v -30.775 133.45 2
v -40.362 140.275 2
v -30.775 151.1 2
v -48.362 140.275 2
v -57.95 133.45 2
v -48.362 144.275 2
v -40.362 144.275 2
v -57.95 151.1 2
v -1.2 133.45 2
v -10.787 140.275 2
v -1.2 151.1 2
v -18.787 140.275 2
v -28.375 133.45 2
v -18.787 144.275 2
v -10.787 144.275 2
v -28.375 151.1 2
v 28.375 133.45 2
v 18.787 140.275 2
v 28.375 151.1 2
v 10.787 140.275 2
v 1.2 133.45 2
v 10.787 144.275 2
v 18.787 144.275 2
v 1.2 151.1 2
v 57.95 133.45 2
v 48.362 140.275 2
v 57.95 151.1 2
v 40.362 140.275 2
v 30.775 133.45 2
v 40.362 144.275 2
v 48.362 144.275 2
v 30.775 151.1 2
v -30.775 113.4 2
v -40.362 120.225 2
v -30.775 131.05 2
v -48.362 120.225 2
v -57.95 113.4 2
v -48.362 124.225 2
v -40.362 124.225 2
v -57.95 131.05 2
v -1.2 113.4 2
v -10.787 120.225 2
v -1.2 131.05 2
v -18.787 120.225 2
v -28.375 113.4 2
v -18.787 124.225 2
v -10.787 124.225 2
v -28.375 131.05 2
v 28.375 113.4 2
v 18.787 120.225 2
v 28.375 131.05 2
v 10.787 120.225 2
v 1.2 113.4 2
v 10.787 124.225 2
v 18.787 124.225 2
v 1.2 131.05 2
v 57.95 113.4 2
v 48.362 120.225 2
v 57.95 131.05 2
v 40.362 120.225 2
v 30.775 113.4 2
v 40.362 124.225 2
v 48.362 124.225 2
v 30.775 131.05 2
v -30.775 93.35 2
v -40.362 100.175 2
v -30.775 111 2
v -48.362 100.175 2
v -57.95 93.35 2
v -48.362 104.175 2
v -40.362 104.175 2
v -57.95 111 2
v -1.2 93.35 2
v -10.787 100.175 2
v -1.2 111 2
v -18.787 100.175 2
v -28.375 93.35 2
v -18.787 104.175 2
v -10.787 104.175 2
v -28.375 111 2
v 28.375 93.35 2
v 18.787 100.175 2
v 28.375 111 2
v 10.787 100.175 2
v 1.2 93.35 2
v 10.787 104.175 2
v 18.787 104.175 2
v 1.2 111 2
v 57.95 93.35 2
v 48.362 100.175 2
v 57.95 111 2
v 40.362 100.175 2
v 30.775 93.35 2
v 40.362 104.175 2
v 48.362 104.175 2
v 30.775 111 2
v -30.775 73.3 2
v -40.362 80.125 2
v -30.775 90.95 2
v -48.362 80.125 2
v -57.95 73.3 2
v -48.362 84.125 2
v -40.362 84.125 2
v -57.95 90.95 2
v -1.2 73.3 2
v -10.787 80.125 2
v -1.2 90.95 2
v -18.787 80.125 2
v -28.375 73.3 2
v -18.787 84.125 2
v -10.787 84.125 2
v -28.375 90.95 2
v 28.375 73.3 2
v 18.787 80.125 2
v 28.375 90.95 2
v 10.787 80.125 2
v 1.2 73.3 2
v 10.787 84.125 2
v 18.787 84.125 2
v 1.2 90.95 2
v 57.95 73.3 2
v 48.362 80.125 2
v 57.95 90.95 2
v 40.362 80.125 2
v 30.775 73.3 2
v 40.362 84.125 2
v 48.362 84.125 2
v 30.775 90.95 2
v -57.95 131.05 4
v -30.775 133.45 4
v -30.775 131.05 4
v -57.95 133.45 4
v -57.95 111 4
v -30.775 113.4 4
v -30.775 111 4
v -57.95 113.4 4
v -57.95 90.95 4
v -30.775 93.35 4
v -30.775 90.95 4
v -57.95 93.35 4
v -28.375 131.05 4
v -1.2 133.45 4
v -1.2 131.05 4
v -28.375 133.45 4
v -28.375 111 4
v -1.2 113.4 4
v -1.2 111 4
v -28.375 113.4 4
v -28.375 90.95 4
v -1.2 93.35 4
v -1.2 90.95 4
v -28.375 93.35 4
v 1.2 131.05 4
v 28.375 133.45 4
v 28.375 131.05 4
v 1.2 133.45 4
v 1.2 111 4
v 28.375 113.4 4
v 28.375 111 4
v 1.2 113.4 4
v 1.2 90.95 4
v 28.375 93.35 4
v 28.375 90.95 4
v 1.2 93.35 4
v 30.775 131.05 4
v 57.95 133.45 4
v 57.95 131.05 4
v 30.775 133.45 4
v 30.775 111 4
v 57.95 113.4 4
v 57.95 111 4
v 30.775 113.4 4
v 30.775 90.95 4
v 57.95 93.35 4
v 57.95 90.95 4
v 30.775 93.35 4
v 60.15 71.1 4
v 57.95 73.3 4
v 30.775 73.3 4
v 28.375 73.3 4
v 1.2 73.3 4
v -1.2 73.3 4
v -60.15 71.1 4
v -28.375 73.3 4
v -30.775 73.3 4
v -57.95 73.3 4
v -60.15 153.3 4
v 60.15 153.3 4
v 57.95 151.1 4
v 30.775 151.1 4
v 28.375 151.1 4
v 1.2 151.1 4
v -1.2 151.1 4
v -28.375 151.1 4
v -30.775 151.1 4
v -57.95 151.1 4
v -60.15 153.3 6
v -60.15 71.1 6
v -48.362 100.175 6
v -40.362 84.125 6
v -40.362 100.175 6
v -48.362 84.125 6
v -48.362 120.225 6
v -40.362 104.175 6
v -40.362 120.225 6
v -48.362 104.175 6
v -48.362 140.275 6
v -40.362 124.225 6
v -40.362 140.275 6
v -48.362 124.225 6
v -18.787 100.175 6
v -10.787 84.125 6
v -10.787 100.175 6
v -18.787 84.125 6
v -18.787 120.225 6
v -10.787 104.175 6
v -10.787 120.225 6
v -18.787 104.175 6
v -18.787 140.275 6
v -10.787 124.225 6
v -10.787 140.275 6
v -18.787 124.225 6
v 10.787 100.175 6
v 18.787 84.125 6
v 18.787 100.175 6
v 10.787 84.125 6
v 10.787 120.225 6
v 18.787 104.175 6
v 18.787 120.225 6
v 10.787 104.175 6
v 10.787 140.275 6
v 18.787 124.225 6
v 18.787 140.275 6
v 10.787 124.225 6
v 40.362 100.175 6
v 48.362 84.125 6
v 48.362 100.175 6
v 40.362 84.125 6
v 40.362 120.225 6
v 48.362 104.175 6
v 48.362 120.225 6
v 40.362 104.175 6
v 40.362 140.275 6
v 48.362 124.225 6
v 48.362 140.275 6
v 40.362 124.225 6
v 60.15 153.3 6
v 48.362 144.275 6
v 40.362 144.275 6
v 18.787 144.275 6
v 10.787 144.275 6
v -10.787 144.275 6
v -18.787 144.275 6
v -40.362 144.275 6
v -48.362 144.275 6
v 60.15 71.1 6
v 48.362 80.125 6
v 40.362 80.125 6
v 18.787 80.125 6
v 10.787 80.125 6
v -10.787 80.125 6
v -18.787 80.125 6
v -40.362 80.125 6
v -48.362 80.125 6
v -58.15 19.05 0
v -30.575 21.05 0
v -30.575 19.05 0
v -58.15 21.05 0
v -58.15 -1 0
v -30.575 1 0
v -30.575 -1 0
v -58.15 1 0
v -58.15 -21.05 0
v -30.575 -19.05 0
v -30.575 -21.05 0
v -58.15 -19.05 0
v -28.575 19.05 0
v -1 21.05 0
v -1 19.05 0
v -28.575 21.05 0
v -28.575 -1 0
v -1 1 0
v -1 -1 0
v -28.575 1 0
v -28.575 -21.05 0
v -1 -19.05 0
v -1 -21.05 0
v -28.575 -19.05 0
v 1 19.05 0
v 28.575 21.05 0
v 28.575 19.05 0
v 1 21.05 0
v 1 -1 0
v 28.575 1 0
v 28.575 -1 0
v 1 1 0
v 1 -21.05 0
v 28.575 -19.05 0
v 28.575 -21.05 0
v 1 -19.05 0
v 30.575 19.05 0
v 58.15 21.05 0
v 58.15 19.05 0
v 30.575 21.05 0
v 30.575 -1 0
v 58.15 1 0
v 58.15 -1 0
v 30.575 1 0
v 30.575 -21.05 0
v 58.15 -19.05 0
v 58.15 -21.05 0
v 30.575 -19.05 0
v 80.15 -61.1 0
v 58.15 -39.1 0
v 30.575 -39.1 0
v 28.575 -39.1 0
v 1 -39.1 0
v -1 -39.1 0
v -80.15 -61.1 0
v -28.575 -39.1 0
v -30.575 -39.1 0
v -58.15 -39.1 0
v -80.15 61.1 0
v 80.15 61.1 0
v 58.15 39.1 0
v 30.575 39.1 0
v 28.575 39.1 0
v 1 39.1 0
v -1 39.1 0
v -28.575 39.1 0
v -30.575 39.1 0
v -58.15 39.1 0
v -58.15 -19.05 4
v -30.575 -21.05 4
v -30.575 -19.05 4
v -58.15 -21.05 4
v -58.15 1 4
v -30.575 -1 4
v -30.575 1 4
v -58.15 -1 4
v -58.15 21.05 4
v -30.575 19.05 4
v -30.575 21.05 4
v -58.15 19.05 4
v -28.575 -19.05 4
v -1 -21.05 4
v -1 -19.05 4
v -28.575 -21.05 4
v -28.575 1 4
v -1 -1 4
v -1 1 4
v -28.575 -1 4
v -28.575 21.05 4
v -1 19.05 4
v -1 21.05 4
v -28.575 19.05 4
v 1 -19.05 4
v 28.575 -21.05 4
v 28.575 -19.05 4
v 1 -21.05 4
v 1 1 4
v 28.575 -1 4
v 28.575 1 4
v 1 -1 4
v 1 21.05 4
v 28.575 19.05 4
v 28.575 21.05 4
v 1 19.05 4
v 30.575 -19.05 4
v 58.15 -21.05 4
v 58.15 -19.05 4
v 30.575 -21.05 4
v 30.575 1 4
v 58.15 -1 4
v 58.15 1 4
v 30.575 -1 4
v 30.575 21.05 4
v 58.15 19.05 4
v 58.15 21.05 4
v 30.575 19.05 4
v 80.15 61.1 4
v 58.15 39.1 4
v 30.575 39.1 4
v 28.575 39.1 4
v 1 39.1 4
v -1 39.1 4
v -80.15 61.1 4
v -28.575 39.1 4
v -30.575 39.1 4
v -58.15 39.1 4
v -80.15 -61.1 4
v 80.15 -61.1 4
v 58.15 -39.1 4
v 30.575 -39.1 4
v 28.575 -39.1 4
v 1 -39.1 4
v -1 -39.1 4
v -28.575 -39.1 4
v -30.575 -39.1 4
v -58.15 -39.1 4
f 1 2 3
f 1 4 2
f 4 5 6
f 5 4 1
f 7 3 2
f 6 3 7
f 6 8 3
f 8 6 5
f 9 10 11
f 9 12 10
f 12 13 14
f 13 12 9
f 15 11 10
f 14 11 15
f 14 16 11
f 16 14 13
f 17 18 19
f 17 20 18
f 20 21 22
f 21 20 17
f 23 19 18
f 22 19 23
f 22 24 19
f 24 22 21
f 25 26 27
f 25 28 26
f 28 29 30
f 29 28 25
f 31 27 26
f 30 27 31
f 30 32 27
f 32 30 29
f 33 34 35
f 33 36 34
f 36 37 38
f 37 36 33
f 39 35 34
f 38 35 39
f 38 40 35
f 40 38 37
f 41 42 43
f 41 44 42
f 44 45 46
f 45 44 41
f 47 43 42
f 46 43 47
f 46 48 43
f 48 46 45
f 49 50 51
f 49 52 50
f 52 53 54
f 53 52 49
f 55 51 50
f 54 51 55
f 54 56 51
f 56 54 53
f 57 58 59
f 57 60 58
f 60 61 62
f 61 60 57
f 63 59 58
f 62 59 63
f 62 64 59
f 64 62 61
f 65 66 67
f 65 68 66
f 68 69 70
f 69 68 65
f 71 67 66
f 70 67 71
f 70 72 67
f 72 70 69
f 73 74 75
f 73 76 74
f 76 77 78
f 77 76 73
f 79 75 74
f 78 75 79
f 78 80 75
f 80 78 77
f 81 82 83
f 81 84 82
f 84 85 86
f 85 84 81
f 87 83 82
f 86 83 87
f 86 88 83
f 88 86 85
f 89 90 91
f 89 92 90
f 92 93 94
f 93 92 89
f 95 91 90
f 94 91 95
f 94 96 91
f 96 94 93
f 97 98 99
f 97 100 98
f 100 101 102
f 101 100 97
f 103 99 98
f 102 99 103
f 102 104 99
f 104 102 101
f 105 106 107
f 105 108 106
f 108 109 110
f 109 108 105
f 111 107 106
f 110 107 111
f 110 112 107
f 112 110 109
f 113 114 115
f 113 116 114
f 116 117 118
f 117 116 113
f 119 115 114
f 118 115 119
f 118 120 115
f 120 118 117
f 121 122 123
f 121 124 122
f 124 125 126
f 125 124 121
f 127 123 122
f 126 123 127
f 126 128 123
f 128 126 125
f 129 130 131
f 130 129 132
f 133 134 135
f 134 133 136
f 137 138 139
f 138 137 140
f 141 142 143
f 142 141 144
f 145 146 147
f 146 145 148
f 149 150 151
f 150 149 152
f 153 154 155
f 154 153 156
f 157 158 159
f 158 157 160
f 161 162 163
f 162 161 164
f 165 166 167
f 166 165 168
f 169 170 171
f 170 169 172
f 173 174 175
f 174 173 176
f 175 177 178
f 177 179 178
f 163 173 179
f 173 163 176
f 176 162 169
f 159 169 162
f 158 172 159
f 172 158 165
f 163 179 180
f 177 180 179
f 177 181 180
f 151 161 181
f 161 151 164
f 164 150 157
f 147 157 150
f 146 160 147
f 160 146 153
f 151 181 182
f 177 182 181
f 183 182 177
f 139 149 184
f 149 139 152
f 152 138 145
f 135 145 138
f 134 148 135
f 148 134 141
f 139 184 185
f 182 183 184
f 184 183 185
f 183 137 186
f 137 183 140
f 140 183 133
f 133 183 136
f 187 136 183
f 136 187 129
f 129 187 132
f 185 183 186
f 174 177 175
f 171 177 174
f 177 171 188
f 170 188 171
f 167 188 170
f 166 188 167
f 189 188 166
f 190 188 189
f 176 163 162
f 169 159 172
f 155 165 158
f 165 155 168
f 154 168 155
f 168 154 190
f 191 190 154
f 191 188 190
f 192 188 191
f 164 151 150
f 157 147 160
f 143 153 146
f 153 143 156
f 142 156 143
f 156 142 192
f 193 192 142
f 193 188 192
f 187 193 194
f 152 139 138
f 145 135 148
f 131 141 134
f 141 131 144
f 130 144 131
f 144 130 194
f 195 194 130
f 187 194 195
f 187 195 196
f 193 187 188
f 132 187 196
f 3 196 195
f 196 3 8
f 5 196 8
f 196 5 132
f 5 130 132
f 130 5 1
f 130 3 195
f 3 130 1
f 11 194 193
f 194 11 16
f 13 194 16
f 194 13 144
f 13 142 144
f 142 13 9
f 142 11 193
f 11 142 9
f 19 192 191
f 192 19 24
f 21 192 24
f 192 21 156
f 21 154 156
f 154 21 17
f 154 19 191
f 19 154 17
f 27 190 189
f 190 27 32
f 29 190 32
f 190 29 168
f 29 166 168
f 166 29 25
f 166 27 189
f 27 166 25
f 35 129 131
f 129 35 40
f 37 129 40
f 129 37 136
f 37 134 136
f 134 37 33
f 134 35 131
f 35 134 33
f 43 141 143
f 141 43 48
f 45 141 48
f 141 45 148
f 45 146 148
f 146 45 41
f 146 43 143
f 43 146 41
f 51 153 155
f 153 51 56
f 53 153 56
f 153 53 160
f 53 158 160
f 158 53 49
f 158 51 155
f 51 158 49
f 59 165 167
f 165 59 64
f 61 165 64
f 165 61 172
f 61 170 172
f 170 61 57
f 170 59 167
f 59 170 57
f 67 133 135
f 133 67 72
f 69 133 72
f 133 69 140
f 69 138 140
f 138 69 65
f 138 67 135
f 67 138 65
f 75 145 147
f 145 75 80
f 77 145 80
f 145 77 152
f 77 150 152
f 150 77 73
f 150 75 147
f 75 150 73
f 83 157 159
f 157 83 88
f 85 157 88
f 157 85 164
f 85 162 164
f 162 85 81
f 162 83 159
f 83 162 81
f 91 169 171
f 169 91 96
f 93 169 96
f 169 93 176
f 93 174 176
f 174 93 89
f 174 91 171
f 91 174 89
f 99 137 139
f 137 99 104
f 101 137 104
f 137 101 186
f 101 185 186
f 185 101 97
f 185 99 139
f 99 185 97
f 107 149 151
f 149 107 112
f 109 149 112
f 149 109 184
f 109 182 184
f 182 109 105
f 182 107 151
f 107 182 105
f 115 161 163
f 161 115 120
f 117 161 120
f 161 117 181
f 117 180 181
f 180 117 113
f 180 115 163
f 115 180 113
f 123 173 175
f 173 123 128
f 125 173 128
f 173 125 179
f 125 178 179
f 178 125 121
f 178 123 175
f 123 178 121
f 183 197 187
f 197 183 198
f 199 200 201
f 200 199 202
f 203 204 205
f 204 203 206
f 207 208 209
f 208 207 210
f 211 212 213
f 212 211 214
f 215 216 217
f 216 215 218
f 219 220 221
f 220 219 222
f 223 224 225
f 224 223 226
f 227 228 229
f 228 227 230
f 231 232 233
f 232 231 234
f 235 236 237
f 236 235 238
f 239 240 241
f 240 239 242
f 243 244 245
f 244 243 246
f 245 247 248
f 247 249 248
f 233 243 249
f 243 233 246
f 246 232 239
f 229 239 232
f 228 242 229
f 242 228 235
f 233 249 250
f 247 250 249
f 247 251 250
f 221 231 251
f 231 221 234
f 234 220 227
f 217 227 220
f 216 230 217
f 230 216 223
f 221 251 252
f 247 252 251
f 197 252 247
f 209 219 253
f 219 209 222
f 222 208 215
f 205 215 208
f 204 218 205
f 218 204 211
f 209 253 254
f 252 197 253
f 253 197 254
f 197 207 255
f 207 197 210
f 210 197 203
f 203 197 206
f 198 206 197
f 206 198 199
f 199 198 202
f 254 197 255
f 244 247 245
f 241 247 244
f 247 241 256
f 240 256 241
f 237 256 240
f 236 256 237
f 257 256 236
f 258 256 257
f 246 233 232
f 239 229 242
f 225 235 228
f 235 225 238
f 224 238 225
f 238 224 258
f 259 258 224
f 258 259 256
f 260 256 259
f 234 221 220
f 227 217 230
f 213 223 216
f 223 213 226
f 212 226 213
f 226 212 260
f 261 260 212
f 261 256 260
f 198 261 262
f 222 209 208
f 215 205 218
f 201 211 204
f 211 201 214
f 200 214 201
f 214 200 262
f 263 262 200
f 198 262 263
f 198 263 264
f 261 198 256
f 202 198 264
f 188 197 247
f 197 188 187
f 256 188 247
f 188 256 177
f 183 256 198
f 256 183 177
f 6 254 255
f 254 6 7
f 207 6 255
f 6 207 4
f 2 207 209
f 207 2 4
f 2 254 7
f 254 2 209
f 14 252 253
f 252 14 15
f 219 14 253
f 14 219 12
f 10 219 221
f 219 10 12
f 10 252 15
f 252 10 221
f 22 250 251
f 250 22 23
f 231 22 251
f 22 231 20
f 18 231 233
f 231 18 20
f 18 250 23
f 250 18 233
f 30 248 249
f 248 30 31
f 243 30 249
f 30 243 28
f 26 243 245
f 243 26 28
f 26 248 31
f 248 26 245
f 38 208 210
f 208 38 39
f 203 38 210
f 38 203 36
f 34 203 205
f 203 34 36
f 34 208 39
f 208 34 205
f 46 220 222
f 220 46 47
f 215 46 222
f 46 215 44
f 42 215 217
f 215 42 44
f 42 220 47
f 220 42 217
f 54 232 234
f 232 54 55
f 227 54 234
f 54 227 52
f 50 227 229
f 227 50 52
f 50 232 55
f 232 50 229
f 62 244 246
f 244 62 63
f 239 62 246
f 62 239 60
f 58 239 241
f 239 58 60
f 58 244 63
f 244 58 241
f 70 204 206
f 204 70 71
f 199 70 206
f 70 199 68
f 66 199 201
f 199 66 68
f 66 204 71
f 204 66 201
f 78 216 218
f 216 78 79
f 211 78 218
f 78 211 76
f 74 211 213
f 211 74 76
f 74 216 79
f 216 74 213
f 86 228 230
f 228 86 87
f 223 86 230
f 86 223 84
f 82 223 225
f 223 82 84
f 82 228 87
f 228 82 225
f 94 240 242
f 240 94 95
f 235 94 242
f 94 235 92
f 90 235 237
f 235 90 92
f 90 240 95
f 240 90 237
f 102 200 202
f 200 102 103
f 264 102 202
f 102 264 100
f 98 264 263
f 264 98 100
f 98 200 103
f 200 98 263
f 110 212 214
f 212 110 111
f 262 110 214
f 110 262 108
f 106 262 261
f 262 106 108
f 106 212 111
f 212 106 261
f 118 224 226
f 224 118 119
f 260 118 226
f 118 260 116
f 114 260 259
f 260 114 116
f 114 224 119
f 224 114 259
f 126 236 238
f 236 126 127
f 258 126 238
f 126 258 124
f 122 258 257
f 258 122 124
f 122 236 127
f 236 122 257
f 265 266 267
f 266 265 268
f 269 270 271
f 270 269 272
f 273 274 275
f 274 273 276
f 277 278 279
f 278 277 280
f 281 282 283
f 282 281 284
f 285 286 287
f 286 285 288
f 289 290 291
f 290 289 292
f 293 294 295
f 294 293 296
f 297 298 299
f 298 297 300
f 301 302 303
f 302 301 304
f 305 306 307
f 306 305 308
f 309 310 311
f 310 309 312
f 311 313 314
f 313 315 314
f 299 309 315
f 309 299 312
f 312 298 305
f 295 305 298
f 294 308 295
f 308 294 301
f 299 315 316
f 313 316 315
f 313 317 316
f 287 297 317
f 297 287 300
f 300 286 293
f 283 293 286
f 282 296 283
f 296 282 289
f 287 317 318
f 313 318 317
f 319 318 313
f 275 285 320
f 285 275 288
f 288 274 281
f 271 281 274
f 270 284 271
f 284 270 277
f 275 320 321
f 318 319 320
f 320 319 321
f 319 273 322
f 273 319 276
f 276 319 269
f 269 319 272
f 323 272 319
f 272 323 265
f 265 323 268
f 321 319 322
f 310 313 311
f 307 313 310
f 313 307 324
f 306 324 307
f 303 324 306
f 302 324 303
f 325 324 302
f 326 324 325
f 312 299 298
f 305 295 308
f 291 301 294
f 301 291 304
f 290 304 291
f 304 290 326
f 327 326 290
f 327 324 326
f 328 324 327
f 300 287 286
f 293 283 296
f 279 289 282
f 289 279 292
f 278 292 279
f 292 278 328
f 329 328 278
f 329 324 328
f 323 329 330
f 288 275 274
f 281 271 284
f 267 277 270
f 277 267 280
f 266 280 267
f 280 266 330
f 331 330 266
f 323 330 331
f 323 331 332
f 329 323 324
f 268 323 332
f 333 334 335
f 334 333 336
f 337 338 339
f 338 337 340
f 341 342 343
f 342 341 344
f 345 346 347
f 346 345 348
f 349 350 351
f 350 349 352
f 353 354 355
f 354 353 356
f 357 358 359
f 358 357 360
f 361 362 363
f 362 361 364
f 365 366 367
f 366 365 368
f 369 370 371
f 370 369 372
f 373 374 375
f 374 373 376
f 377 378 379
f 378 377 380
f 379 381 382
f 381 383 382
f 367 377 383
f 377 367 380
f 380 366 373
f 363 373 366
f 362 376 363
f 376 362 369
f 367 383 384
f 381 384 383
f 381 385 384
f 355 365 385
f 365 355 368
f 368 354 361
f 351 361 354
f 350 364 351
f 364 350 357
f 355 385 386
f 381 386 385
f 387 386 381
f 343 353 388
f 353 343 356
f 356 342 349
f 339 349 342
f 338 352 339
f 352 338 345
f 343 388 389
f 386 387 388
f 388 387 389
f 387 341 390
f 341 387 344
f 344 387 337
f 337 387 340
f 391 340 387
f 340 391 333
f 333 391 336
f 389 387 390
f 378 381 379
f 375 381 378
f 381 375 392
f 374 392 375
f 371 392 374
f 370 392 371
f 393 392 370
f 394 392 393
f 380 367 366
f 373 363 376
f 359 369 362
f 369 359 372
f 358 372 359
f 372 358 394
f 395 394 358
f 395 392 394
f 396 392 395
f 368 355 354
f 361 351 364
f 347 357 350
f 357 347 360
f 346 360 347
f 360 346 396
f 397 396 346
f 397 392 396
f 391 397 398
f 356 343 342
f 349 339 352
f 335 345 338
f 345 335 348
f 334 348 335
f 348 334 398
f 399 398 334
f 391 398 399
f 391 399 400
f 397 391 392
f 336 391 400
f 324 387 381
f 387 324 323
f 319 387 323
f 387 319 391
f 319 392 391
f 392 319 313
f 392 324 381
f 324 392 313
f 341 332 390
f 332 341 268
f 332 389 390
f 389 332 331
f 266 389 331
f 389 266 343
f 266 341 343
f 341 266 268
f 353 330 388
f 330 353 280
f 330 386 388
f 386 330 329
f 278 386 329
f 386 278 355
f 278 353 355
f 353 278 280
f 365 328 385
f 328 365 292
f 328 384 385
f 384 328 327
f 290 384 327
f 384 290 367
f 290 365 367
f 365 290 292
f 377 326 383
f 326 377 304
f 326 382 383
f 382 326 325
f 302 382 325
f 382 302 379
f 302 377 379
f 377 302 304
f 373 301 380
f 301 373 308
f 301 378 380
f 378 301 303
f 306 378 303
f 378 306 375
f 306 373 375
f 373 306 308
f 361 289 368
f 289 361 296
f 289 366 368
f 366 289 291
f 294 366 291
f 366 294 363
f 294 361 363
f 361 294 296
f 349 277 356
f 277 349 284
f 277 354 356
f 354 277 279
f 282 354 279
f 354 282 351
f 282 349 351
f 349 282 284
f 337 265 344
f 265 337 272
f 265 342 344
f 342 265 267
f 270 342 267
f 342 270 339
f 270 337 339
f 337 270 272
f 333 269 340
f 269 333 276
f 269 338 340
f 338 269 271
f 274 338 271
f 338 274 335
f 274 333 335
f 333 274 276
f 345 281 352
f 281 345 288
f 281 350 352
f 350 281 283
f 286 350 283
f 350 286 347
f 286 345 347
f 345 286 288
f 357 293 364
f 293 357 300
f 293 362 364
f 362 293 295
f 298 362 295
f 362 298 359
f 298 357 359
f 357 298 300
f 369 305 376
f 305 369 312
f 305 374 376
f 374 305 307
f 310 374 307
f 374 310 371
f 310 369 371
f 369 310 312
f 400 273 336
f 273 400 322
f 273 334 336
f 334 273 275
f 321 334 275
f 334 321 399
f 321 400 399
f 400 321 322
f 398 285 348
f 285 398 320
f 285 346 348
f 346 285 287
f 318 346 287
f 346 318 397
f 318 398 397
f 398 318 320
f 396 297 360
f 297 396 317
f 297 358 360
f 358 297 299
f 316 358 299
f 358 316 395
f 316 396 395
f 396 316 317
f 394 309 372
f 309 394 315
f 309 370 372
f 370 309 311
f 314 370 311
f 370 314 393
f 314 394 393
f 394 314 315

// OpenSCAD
// file: ../common/shared-variables.scad
$fn = 150;

u_1 = 19.05;

plate_corner_radius = 2;

screw_hole_diameter = 2.7;

switch_neck_thickness = 1.2;
switch_neck_width = 13.9;
switch_hole_width = switch_neck_width + 2;

rotary_encoder_width = 17;
rotary_encoder_height = 17;

magnet_diameter = 5 + 0.3;
magnet_depth = 2 + 0.2;
magnet_inset = 5;

module_width_x_unit = 20;
module_height_y = 180;

module_bottom_base_thickness = 4;

pcb_thickness = 1.6;

wall_tolerance = 0.5;
outer_wall_thickness_base = 2;
outer_wall_thickness = outer_wall_thickness_base - (wall_tolerance / 2);
inner_wall_thickness = 2;

inner_wall_height = 3;
outer_wall_height = inner_wall_height + pcb_thickness;

screw_hole_inset_pcb = 4;
screw_hole_inset = screw_hole_inset_pcb + outer_wall_thickness_base;

threaded_insert_towers_diameter = 5;
threaded_insert_towers_radius = threaded_insert_towers_diameter / 2;

threaded_insert_length = 4;
threaded_insert_knurl_diameter = 3;

side_connector_height = 4.7;
side_connector_length = 23;
side_connector_offset = 40;

back_connector_height = 5;
back_connector_offset = 15;

bottom_module_base_cutout_inset_x = 10;
bottom_module_base_cutout_inset_y = 10;

module_top_thickness = 2;

module_total_height = module_bottom_base_thickness + outer_wall_height + module_top_thickness;
// file: ../common/shared-utils.scad
include <./shared-variables.scad>

module rounded_rectangle(size, corner_radius, center = false) {

    x_offset = center ? -size.x / 2 : 0;
    y_offset = center ? -size.y / 2 : 0;

    corners_points = [
            [corner_radius, corner_radius],
            [size.x - corner_radius, corner_radius],
            [size.x - corner_radius, size.y - corner_radius],
            [corner_radius, size.y - corner_radius],
        ];

    hull() {
        for (p = corners_points) {
            translate([p.x + x_offset, p.y + y_offset, -1])
                circle(corner_radius);
        }
    }
}

module rectangle_with_circle_corners(size, circle_radius = 1, center = false) {
    x_offset = center ? 0 : size.x / 2;
    y_offset = center ? 0 : size.y / 2;
    offset = [x_offset, y_offset];

    translate(offset) {
            square(size, center = true);

            x = (size.x / 2) - circle_radius/2;
            y = (size.y / 2) - circle_radius/2;
            points = [[-x, -y], [x, -y], [-x, y], [x, y]];

            for (p = points) {
                translate([p.x, p.y]) {
                    circle(r = circle_radius);
                }
            }
    }
}

module circle_segment(radius, cut_off_height) {
    intersection() {
        translate([0, -cut_off_height]) {
            circle(radius);
        }
        translate([-radius, 0]) {
            square([radius * 2, cut_off_height * 2]);
        }
    }
}

module tear_drop_circle(d) {
    r = d / 2;
    angle = 30;
    offset_y = r / 2;
    offset_x = cos(angle) * r;

    triangle_points = [
            [-offset_x, r / 2],
            [offset_x, r / 2],
            [0, 3 / 2 * r]
        ];

    polygon(triangle_points);
    circle(d = d);
}

module threaded_insert_cutout() {
    k = threaded_insert_knurl_diameter;
    l = threaded_insert_length;

    k1 = k + 0.2;
    k2 = k * 0.9;

    l1 = l * 0.25;
    l2 = l + 1;

    translate([0, 0, -l1]) {
        linear_extrude(l1) {
            circle(d = k1);
        }
    }

    translate([0, 0, -l2]) {
        linear_extrude(l2) {
            circle(d = k2);
        }
    }
}

function flatten(l) = [ for (a = l) for (b = a) b ] ;
// main file
use <../common/shared-utils.scad>
include <../common/shared-variables.scad>

cap_size = [u_1 * 1.5 - 1, u_1 - 1];
cap_stem_size = [8, 4];

border_thickness = 2;
base_jig_margin = 20;

num_x = 4;
num_y = 4;

size_x = cap_size.x * num_x + border_thickness * (num_x + 1);
size_y = cap_size.y * num_y + border_thickness * (num_y + 1);

echo(cap_size);

base_jig();

translate([0, size_y + 30]) {
    color("green")
        //rotate(180, [1, 0, 0])
        press();
}

module base_jig() {
    linear_extrude(4) {
        difference() {
            square([size_x + base_jig_margin * 2, size_y + base_jig_margin * 2], center = true);
            union() {
                for (i = [0 : num_x - 1]) {
                    for (j = [0 : num_y - 1]) {
                        x = border_thickness + (i * (cap_size.x + border_thickness)) - size_x / 2;
                        y = border_thickness + (j * (cap_size.y + border_thickness)) - size_y / 2;
                        translate([x, y]) {
                            square(cap_size);
                        }
                    }
                }
            }

        }
    }
}

module press() {
    translate([0, 0, 2]) {
        difference() {
            union() {
                linear_extrude(2) {
                    union() {
                        for (i = [0 : num_x - 1]) {
                            for (j = [0 : num_y - 1]) {
                                x = border_thickness + (i * (cap_size.x + border_thickness)) + 0.2 - size_x / 2;
                                y = border_thickness + (j * (cap_size.y + border_thickness)) + 0.2 - size_y / 2;
                                translate([x, y]) {
                                    difference() {
                                        width_x = cap_size.x - 0.4;
                                        width_y = cap_size.y - 0.4;
                                        square([width_x, width_y]);
                                    }
                                }
                            }
                        }
                    }
                }

                translate([0, 0, 2]) {
                    linear_extrude(2) {
                        difference() {
                            square([size_x, size_y], center = true);

                        }
                    }
                }
            }

            linear_extrude(4) {
                for (i = [0 : num_x - 1]) {
                    for (j = [0 : num_y - 1]) {
                        x = border_thickness + (i * (cap_size.x + border_thickness)) + 0.2 - size_x / 2;
                        y = border_thickness + (j * (cap_size.y + border_thickness)) + 0.2 - size_y / 2;
                        translate([x, y]) {
                            difference() {
                                width_x = cap_size.x - 0.4;
                                width_y = cap_size.y - 0.4;
                                translate([width_x / 2, width_y / 2]) {
                                    square(cap_stem_size, center = true);
                                }
                            }
                        }
                    }
                }
            }
        }
    }
}
